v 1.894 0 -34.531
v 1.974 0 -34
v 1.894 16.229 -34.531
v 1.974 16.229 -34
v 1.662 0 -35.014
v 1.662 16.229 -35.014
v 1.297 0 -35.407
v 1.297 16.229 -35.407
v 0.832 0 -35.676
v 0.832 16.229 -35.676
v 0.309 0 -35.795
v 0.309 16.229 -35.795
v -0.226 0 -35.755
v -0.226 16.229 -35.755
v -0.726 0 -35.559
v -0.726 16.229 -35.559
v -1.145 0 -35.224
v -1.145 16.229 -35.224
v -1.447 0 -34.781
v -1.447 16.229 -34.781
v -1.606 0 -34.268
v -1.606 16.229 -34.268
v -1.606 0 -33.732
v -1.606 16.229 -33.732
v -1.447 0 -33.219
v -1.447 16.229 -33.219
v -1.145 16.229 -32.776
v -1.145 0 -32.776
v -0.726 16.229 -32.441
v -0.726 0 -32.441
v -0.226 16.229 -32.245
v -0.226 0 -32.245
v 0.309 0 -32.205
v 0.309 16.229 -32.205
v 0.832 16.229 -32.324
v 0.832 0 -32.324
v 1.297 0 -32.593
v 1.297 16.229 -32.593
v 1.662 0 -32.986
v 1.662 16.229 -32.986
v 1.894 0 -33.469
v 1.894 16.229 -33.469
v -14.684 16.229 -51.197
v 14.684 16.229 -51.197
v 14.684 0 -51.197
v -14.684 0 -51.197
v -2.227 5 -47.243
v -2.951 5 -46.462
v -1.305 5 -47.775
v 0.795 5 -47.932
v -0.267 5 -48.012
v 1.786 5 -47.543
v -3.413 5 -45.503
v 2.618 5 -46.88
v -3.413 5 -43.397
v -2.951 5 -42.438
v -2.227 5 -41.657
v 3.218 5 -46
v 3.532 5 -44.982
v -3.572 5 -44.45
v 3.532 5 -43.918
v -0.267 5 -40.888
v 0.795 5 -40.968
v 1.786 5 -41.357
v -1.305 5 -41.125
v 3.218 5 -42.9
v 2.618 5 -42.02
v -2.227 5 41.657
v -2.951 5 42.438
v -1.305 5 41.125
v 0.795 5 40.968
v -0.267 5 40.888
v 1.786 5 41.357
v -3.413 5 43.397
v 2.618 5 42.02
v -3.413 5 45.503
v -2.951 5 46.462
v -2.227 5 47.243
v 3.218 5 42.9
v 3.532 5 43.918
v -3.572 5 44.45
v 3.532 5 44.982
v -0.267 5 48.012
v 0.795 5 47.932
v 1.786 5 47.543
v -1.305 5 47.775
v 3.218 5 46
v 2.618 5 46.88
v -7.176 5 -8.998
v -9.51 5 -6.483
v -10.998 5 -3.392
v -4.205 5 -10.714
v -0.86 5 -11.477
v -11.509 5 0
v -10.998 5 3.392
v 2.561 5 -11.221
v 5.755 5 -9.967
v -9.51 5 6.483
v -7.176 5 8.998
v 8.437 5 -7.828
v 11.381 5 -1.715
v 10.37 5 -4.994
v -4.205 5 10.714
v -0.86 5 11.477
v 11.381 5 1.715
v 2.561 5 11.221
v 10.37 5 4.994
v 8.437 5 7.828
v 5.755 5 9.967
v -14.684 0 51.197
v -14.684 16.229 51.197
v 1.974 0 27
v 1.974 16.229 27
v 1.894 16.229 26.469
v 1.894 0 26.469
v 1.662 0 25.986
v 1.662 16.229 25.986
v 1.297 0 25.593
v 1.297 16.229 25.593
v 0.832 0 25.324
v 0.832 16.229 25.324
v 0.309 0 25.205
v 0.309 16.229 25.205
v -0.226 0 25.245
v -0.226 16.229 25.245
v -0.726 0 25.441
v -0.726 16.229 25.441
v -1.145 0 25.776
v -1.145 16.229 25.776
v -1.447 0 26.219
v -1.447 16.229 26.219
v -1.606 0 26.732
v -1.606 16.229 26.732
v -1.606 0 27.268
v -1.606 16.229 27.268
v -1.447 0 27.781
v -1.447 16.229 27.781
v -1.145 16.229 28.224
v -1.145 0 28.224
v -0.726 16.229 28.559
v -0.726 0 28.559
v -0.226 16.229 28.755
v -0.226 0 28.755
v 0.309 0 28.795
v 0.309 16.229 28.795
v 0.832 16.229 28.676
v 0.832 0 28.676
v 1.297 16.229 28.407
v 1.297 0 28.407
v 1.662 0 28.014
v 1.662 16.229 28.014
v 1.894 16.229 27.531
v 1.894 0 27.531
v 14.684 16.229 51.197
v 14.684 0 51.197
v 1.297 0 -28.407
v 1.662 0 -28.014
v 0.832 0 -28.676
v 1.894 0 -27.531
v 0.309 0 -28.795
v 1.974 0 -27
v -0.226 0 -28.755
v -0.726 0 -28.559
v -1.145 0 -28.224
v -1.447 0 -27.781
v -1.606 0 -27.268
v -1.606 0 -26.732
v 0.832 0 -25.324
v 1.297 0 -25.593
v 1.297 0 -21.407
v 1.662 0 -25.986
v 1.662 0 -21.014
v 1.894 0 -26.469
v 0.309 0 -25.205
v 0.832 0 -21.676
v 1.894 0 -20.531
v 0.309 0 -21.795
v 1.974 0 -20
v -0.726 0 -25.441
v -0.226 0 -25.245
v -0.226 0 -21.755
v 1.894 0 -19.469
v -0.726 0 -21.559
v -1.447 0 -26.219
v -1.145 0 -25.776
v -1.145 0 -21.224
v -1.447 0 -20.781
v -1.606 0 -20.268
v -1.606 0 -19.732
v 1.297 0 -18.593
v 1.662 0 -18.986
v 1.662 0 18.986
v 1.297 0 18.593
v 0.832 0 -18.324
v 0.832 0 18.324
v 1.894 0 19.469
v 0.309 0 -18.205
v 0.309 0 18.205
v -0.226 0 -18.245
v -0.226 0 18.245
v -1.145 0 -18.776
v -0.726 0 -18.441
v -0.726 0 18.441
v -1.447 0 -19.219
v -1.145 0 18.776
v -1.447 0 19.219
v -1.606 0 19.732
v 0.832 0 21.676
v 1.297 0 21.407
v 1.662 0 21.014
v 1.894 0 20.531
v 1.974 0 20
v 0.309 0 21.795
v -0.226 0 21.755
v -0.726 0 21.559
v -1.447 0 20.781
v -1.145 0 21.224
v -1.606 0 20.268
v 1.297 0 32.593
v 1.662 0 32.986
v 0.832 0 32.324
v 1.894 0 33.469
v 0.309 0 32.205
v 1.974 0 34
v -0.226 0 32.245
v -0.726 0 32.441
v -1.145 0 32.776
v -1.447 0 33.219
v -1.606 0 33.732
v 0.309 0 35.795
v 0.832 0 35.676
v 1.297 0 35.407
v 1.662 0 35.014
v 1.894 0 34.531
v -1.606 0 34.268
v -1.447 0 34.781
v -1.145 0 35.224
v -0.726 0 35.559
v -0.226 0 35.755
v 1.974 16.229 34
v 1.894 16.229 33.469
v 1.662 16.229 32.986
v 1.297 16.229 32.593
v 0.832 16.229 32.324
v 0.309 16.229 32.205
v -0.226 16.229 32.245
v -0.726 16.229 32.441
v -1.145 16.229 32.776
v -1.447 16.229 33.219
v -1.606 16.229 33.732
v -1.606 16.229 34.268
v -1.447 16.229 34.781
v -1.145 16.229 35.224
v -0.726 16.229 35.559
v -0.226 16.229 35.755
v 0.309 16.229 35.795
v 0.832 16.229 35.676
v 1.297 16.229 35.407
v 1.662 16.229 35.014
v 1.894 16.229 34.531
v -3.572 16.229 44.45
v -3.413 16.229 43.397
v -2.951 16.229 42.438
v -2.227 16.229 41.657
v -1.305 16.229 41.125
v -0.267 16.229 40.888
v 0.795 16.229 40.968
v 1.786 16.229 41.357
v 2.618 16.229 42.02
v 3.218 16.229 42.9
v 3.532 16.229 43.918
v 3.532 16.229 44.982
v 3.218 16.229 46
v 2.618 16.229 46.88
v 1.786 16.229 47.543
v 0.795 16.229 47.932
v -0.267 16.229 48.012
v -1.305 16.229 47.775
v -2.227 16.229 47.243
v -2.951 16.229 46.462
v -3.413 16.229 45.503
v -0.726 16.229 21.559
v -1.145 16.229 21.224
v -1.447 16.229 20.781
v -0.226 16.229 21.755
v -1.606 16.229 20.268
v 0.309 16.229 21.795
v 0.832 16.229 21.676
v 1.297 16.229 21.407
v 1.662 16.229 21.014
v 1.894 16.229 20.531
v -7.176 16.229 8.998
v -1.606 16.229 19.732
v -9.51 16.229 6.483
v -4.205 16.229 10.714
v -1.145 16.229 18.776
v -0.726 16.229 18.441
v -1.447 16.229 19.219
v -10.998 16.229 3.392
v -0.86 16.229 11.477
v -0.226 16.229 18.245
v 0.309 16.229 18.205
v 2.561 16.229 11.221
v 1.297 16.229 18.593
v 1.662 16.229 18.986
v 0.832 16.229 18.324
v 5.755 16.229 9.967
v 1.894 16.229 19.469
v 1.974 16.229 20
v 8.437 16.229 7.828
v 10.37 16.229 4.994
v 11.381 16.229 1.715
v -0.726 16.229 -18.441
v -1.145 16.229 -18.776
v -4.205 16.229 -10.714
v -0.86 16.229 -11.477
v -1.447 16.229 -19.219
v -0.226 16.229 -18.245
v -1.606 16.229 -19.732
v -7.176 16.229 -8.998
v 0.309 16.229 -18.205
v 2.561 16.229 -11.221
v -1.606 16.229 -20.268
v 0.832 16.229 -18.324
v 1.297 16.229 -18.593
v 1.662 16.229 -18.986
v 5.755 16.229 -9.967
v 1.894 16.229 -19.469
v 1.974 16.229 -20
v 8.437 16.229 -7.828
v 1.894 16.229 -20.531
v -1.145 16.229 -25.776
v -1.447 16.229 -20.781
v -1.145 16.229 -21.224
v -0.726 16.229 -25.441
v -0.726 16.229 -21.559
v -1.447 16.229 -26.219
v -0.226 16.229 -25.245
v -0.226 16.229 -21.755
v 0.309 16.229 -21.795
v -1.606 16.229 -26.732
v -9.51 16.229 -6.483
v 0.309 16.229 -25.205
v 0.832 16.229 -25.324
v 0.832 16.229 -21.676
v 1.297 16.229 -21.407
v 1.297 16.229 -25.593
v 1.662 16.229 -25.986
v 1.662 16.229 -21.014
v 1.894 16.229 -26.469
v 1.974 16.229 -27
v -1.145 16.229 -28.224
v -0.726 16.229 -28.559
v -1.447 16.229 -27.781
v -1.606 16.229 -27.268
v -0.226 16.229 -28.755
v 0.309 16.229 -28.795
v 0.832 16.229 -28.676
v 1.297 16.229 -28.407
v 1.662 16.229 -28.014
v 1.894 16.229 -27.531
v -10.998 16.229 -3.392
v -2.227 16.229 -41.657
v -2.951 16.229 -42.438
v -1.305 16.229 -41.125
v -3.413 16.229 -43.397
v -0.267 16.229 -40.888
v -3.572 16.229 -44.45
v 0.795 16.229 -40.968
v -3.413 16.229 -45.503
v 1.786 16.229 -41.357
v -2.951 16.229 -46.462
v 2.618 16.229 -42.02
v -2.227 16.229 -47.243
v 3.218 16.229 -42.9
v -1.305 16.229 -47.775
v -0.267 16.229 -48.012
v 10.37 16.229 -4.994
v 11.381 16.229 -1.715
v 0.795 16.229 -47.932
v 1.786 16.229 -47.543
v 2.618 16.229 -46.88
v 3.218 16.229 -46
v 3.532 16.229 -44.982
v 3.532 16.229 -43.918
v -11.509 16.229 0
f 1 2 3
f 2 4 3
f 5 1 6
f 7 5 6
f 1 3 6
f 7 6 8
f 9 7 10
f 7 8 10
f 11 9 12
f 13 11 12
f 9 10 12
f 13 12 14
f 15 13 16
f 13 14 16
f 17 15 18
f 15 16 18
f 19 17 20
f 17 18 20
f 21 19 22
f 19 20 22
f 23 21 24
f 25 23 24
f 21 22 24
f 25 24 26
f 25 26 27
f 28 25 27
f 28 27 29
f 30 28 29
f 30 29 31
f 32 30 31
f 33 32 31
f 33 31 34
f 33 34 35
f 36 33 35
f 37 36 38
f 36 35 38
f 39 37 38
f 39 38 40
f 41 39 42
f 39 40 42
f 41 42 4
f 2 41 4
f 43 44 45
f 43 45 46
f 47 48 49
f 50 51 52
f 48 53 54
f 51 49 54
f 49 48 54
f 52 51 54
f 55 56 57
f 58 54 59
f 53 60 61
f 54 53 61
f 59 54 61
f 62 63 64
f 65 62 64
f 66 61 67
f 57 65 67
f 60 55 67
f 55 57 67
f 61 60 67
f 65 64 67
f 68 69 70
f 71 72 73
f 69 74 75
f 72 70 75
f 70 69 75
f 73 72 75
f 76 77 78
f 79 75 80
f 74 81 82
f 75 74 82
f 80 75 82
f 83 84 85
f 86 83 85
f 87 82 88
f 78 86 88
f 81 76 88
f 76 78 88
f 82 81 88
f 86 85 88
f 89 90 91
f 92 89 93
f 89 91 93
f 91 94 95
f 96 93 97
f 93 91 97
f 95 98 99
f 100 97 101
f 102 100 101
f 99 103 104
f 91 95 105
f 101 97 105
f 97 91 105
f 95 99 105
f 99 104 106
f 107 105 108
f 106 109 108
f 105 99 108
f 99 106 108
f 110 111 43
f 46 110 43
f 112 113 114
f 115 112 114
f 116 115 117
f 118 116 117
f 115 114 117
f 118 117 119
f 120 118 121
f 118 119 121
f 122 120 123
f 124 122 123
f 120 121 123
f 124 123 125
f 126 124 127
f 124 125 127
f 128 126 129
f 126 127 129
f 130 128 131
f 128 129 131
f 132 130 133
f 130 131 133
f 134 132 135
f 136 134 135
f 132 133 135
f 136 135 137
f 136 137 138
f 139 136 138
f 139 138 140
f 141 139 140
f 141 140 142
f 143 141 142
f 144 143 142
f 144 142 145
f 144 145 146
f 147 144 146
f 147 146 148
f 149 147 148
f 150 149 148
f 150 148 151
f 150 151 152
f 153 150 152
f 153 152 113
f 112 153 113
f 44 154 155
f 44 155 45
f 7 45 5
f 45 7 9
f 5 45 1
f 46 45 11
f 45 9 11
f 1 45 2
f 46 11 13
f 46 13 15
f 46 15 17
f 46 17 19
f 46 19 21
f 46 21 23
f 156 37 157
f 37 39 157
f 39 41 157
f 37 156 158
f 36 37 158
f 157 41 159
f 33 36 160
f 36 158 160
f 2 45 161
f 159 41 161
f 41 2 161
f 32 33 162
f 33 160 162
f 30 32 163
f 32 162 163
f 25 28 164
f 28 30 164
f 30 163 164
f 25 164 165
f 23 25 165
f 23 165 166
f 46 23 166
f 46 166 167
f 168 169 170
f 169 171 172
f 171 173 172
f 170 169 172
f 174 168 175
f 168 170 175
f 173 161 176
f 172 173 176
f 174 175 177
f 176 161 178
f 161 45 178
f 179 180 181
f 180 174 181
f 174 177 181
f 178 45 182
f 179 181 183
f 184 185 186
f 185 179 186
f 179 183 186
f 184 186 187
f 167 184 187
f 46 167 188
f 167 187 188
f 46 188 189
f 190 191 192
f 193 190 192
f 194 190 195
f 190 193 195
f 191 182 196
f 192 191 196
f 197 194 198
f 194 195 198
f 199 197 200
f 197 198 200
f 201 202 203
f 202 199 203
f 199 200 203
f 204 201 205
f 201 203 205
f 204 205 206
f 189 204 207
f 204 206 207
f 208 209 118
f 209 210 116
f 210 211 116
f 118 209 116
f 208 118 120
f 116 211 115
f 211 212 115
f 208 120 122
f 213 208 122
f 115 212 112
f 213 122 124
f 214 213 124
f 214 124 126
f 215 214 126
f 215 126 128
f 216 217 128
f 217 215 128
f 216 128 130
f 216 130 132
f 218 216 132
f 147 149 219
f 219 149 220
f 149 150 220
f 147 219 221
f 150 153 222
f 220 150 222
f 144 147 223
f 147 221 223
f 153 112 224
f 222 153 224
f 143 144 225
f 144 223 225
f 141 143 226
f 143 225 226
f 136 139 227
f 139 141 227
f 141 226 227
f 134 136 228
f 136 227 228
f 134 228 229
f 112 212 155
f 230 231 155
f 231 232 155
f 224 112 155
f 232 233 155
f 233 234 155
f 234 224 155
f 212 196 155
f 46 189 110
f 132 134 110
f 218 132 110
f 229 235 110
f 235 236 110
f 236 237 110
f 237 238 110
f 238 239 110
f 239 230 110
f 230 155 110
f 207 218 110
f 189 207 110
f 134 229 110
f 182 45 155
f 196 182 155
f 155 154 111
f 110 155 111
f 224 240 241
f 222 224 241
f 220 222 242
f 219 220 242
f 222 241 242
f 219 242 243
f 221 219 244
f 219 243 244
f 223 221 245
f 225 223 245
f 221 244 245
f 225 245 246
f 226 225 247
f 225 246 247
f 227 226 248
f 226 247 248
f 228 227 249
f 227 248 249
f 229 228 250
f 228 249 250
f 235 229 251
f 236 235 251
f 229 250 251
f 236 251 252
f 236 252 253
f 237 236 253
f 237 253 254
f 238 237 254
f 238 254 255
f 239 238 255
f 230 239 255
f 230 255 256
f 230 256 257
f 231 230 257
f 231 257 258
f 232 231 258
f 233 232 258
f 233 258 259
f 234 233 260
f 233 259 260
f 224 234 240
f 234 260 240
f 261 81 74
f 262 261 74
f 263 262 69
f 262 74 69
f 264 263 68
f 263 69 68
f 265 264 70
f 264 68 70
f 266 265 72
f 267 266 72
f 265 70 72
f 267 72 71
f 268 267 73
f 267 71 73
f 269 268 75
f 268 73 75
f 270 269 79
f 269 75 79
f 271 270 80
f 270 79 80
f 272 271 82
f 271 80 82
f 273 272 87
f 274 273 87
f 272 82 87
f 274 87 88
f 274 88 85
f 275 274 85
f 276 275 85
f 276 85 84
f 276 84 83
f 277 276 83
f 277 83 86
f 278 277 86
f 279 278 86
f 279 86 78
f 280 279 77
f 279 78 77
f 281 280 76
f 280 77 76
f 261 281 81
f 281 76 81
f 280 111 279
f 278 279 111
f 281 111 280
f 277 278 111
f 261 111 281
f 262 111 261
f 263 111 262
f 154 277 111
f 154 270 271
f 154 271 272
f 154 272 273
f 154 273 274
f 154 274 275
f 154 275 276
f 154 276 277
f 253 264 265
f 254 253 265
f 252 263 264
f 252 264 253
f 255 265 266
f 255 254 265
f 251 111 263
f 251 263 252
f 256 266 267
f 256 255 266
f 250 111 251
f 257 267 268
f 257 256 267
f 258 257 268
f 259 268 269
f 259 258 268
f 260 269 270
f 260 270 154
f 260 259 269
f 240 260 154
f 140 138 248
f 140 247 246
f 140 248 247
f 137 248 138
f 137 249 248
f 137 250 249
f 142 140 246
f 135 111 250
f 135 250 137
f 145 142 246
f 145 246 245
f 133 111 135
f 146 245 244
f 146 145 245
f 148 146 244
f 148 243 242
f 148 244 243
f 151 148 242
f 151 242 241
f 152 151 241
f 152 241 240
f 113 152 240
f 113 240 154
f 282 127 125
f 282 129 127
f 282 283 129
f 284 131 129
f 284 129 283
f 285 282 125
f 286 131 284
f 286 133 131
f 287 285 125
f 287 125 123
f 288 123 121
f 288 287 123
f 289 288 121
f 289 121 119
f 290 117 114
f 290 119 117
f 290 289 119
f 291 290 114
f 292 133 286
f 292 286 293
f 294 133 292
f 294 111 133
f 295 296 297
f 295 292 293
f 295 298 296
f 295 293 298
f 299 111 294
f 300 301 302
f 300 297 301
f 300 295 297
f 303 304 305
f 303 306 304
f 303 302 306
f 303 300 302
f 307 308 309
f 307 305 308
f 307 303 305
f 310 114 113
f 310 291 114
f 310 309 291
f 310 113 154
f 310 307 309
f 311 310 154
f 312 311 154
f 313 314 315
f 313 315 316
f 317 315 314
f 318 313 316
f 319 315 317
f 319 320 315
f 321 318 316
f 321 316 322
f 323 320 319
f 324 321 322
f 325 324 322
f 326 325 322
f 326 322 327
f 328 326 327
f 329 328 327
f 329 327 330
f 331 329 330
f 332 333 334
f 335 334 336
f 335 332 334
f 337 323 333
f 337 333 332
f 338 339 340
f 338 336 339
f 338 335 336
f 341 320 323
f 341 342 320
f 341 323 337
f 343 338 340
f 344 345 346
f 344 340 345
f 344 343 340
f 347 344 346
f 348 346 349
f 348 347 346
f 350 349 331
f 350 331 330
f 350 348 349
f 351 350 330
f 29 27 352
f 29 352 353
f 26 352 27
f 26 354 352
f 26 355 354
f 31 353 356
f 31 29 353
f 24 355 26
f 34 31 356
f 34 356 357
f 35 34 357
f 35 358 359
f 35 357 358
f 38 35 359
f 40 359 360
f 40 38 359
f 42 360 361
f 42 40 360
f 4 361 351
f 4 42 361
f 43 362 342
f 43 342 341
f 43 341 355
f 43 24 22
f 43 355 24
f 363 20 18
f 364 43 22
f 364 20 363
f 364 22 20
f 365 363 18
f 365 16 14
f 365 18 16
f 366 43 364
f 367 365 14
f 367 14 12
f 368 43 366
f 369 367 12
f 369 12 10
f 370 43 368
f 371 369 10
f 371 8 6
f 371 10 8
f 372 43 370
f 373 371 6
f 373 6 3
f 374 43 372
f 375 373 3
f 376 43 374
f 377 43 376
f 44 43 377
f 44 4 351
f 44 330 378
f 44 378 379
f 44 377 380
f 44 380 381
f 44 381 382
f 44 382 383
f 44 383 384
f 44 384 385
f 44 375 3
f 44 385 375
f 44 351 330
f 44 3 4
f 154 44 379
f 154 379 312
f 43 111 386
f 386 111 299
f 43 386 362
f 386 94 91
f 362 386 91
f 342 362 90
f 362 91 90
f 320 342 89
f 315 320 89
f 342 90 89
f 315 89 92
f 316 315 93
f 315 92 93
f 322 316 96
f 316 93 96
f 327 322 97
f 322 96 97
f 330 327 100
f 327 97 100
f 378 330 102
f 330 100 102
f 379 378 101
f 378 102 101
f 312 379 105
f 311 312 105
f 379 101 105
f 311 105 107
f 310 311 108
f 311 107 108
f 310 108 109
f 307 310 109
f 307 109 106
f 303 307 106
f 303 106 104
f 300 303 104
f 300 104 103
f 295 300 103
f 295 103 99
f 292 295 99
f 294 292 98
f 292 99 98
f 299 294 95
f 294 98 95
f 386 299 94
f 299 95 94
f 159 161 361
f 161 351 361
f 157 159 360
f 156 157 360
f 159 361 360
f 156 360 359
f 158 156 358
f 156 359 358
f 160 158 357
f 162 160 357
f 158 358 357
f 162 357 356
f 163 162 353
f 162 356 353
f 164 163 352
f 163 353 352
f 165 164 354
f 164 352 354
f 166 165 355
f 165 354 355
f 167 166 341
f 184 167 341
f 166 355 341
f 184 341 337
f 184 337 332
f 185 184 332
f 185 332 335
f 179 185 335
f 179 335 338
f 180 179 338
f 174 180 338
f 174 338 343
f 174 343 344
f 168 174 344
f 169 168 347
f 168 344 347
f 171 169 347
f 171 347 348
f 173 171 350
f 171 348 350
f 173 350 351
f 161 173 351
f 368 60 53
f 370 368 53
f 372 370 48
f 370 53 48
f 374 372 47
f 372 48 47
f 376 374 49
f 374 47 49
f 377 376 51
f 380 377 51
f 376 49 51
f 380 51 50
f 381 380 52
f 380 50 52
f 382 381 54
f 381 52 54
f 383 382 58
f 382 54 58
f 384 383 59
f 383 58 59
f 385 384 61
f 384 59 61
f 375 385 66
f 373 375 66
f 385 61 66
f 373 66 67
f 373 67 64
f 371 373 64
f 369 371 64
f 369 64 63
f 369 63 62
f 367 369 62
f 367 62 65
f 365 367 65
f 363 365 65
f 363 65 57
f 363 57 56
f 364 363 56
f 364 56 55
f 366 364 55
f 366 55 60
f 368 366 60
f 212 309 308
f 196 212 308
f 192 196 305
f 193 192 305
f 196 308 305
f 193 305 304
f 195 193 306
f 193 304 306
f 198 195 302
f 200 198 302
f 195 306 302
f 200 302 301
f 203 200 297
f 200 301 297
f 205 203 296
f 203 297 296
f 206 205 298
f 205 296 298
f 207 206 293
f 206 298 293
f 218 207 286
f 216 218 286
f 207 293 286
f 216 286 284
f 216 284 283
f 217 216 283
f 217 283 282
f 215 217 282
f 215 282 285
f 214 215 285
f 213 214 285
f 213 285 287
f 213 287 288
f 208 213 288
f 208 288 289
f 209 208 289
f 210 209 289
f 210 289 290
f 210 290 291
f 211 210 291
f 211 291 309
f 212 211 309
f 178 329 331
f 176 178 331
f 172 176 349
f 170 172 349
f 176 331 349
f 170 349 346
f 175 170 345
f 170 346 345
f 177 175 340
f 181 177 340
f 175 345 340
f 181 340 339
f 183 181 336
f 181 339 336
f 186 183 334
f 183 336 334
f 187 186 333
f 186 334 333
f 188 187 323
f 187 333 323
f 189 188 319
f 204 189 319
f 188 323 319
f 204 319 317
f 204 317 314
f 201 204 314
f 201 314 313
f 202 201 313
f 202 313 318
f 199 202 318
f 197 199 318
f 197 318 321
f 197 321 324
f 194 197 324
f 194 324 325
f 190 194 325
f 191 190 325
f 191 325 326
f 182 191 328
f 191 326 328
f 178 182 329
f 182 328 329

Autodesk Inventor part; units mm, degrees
ref_plane "YZ Plane" through (0, 0, 0) normal (1, 0, 0) x (0, 1, 0)
ref_plane "XZ Plane" through (0, 0, 0) normal (0, 1, 0) x (-1, 0, 0)
ref_plane "XY Plane" through (0, 0, 0) normal (0, 0, 1) x (1, 0, 0)
sketch "Sketch1" plane through (0, 0, 0) normal (0, 1, 0) x (-1, 0, 0)
  line L0 (19.05, -83) -> (19.05, 83)
  line L1 (-19.05, 83) -> (-19.05, -83)
  circle A0 centre (0, 0) radius 11.5094
  line L2 (0, 0) -> (-0.4877, 3.251) construction
  line L3 (0, 0) -> (0, 44.45) construction
  line L4 (0, 0) -> (0, -44.45) construction
  circle A1 centre (0, 44.45) radius 3.5719
  circle A2 centre (0, -44.45) radius 3.5719
  line L5 (19.05, 83) -> (-19.05, 83)
  line L6 (19.05, -83) -> (-19.05, -83)
  dimension "d2" = 23.0188
  dimension "d4" = 44.45
  dimension "d5" = 44.45
  dimension "d6" = 7.1437
  dimension "d7" = 7.1437
extrude "Extrusion1" add sketch "Sketch1" along normal blind 25.4
sketch "Sketch6" plane through (0, 0, 0) normal (0, -1, 0) x (1, 0, 0)
  circle A0 centre (0, 44.45) radius 3.5719 projected
  circle A1 centre (0, 44.45) radius 3.5719
  circle A2 centre (0, -44.45) radius 3.5719 projected
  circle A3 centre (0, -44.45) radius 3.5719
  circle A4 centre (0, 0) radius 5.1594
  circle A5 centre (0, 0) radius 11.5094
  dimension "d102" = 35.7188
sketch "Sketch13" plane through (0, 25.4, 0) normal (0, 1, 0) x (1, 0, 0)
  line L0 (-19.05, -83) -> (19.05, -83) construction
  line L1 (0.1743, -83) -> (0.1743, 83) construction
  line L2 (19.05, 83) -> (-19.05, 83) construction
  circle A0 centre (0.1743, -34) radius 1.8
  circle A1 centre (0.1743, -27) radius 1.8
  circle A2 centre (0.1743, -20) radius 1.8
  circle A3 centre (0.1743, 20) radius 1.8
  circle A4 centre (0.1743, 27) radius 1.8
  circle A5 centre (0.1743, 34) radius 1.8
  circle A6 centre (0, 0) radius 11.5094 projected
  line L3 (-19.05, 83) -> (-19.05, -83) projected
  line L4 (-19.05, -83) -> (-14.6844, -83)
  line L5 (-14.6844, -83) -> (-14.6844, 83)
  line L6 (-14.6844, 83) -> (-19.05, 83)
  line L7 (-19.05, 83) -> (-19.05, -83)
  line L8 (19.05, -83) -> (14.6844, -83)
  line L9 (14.6844, -83) -> (14.6844, 83)
  line L10 (14.6844, 83) -> (19.05, 83)
  line L11 (19.05, 83) -> (19.05, -83)
  dimension "d82" = 3.6
  dimension "d83" = 3.6
  dimension "d84" = 3.6
  dimension "d85" = 3.6
  dimension "d86" = 3.6
  dimension "d87" = 3.6
  dimension "d88" = 7
  dimension "d89" = 7
  dimension "d90" = 7
  dimension "d92" = 7
  dimension "d93" = 20
  dimension "d94" = 20
  dimension "d97" = 3.175
  dimension "d99" = 3.175
sketch "Sketch14" plane through (19.05, 0, -83) normal (0, 0, -1) x (-1, 0, 0)
  line L0 (0, 0) -> (0, 25.4) projected
  line L1 (38.1, 0) -> (38.1, 25.4) projected
  line L2 (0, 25.4) -> (38.1, 25.4)
  line L3 (38.1, 25.4) -> (38.1, 16.2292)
  line L4 (38.1, 16.2292) -> (0, 16.2292)
  line L5 (0, 16.2292) -> (0, 25.4)
  point P0 (19.05, 0)
extrude "Extrusion15" cut sketch "Sketch14" against normal up to next
sketch "Sketch15" plane through (-19.05, 16.2292, -83) normal (0, 1, 0) x (1, 0, 0)
  line L0 (38.1, -166) -> (0, -166) projected
  line L1 (38.1, 0) -> (38.1, -166) projected
  line L2 (0, -166) -> (38.1, -166)
  line L3 (38.1, -166) -> (38.1, -134.1969)
  line L4 (38.1, -134.1969) -> (0, -134.1969)
  line L5 (0, -134.1969) -> (0, -166)
  circle A0 centre (19.05, -127.45) radius 3.5719 projected
  line L6 (0, -166) -> (0, 0) projected
  line L7 (0, 0) -> (38.1, 0)
  line L8 (38.1, 0) -> (38.1, -31.8031)
  line L9 (38.1, -31.8031) -> (0, -31.8031)
  line L10 (0, -31.8031) -> (0, 0)
  circle A1 centre (19.05, -38.55) radius 3.5719 projected
  point P0 (19.05, -83)
  dimension "d78" = 3.175
  dimension "d79" = 3.175
extrude "Extrusion16" cut sketch "Sketch15" against normal up to next contours L0 L5 L4 L1 | L9 L6 L7 L1
extrude "Extrusion18" cut sketch "Sketch13" against normal up to next contours A0 | A1 | A2 | A3 | A4 | A5 | L6 L5 L4 L3 | L8 L9 L10 L11
extrude "Extrusion19" add sketch "Sketch6" against normal blind 5 contours A0 | A2 | A4 | A5
properties part number "RodBase"
